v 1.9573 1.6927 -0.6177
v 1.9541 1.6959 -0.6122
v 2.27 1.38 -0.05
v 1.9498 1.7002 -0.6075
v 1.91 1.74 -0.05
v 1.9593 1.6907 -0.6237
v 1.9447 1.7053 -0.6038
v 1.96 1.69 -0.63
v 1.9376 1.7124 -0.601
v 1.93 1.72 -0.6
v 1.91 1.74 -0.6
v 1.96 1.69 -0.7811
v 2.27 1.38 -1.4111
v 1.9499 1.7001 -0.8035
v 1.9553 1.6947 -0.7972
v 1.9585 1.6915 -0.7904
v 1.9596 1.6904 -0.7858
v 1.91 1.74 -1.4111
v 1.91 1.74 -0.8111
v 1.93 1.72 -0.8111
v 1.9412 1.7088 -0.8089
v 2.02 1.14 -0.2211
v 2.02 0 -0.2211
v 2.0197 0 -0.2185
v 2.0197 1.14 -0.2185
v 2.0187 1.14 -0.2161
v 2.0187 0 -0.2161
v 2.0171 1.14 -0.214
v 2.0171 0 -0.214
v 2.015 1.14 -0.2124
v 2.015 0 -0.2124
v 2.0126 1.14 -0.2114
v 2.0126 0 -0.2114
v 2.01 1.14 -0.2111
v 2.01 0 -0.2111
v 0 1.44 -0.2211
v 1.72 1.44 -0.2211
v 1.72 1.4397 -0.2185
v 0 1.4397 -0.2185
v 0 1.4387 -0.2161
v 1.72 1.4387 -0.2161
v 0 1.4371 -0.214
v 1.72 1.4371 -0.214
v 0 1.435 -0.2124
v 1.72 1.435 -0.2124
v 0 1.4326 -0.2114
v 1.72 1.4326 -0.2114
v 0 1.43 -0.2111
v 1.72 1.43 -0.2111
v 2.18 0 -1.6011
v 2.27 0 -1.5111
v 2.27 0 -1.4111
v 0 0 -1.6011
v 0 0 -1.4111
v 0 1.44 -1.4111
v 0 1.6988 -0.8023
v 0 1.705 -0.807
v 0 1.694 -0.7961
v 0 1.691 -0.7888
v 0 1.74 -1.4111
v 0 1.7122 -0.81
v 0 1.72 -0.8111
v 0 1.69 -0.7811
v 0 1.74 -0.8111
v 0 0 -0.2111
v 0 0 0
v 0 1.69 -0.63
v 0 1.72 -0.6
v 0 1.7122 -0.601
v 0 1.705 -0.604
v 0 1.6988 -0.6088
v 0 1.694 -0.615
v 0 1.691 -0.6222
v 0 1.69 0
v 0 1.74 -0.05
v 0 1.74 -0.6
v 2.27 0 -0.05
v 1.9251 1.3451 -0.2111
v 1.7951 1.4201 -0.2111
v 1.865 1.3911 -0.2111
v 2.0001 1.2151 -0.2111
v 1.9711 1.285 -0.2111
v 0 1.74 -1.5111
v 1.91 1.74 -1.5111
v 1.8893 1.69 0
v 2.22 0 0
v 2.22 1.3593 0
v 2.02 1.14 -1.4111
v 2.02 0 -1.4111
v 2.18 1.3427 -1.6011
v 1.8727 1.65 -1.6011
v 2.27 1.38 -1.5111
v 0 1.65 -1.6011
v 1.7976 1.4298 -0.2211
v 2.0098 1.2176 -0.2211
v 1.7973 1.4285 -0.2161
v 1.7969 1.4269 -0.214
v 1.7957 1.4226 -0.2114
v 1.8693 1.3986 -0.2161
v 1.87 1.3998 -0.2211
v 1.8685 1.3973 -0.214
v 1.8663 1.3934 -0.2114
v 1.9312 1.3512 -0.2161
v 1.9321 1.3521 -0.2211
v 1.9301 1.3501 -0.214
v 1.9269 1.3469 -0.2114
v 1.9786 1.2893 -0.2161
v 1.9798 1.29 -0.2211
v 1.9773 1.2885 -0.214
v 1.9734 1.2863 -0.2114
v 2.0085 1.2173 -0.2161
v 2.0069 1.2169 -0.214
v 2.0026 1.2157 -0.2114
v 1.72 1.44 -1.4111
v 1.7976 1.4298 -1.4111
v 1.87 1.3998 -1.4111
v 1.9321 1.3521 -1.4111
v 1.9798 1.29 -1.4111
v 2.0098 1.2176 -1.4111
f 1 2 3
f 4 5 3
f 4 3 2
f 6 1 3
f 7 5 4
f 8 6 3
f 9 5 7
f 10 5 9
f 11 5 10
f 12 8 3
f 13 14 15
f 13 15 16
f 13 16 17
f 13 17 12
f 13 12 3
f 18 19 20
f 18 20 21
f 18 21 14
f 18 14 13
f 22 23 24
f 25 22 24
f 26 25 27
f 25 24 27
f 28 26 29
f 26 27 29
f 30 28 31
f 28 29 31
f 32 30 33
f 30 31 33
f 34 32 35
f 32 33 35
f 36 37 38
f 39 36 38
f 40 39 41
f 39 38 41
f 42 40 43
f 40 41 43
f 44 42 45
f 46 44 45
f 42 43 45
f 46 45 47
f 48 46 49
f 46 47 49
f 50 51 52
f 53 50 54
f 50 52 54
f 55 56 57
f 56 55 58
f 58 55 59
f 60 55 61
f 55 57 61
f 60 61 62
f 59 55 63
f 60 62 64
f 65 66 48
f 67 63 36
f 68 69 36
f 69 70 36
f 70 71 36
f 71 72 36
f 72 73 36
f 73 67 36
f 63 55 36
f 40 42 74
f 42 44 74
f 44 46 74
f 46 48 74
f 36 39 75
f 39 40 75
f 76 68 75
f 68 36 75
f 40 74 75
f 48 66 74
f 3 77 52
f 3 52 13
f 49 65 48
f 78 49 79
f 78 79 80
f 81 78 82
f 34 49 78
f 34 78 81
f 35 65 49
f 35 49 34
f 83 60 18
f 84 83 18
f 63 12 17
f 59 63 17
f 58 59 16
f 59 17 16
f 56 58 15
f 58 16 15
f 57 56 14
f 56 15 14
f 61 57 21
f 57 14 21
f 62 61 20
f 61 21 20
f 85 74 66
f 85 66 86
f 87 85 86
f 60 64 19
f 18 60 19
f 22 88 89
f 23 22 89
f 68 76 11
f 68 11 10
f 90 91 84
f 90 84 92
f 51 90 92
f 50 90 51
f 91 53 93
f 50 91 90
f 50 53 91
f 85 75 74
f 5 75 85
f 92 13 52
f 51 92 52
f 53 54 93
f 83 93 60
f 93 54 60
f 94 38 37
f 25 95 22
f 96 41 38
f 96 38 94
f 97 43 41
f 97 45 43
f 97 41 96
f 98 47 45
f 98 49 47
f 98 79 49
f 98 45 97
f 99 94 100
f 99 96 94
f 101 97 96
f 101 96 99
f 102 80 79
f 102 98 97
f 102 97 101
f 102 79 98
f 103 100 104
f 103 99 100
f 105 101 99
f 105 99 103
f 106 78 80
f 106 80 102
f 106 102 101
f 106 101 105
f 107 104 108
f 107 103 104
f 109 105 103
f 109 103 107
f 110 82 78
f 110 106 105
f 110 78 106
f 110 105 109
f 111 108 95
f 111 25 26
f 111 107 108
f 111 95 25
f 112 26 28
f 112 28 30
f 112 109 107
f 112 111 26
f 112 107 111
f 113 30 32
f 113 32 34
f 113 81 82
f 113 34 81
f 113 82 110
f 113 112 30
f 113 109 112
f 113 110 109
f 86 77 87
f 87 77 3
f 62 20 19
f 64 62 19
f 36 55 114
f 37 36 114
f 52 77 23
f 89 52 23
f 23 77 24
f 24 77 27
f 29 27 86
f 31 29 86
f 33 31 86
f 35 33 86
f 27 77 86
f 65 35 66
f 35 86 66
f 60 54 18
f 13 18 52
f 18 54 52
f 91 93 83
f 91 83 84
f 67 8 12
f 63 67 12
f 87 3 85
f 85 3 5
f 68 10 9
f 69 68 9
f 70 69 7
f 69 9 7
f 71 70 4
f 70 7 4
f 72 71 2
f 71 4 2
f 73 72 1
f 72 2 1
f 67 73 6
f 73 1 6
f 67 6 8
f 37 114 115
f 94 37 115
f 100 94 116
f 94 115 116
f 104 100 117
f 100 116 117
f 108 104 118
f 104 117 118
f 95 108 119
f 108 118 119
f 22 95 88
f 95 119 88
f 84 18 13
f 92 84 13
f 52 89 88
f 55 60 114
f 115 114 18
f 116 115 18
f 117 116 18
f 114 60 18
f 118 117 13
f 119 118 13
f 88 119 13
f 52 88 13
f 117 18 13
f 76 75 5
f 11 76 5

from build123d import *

# Parameters (mm, degrees)
F0_W      = 4.54
F0_H      = 3.48
F1_DEPTH  = 1.41106
F2_SIZE   = 0.36
F3_SIZE2  = 0.05
F3_SIZE   = 0.05
F5_DEPTH  = 4.541
F7_DEPTH  = 1.2
F8_R      = 0.01
F10_DEPTH = 0.19
F11_SIZE  = 0.09
F13_DEPTH = 25


with BuildPart() as f1:
    # F0 (on Top) → F1 (new body)
    with BuildSketch(Plane.XY):
        Rectangle(F0_W, F0_H)
    extrude(amount=-F1_DEPTH)

    # F2
    f2_edges = [f1.edges().sort_by_distance(p)[0] for p in [
        (-2.27, 1.74, -0.70553),
        (-2.27, -1.74, -0.70553),
        (2.27, 1.74, -0.70553),
        (2.27, -1.74, -0.70553),
    ]]
    chamfer(f2_edges, length=F2_SIZE)

    # F3
    f3_edges = [f1.edges().sort_by_distance(p)[0] for p in [
        (-2.27, 0, 0),
        (-2.09, 1.56, 0),
        (0, 1.74, 0),
        (2.09, 1.56, 0),
        (2.27, 0, 0),
        (2.09, -1.56, 0),
        (0, -1.74, 0),
        (-2.09, -1.56, 0),
    ]]
    chamfer(f3_edges, length=F3_SIZE, length2=F3_SIZE2)

    # F4 (on face) → F5 (cut, through all)
    with BuildSketch(Plane.YZ.offset(2.27)):
        with BuildLine():
            Line((-1.72, -0.6), (-1.74, -0.6))
            Line((-1.74, -0.6), (-1.74, -0.81106))
            Line((-1.74, -0.81106), (-1.72, -0.81106))
            ThreePointArc((-1.72, -0.81106), (-1.6987867966, -0.8022732034), (-1.69, -0.78106))
            Line((-1.69, -0.78106), (-1.69, -0.63))
            ThreePointArc((-1.69, -0.63), (-1.6987867966, -0.6087867966), (-1.72, -0.6))
        make_face()
        with BuildLine():
            Line((1.74, -0.81106), (1.74, -0.6))
            Line((1.74, -0.6), (1.72, -0.6))
            ThreePointArc((1.72, -0.6), (1.6987867966, -0.6087867966), (1.69, -0.63))
            Line((1.69, -0.63), (1.69, -0.78106))
            ThreePointArc((1.69, -0.78106), (1.6987867966, -0.8022732034), (1.72, -0.81106))
            Line((1.72, -0.81106), (1.74, -0.81106))
        make_face()
    extrude(amount=-F5_DEPTH, mode=Mode.SUBTRACT)

    # F6 (on face) → F7 (cut)
    with BuildSketch(Plane(origin=(0, 0, -1.41106), x_dir=(1, 0, 0), z_dir=(0, 0, -1))):
        with BuildLine():
            Line((1.72, 1.44), (-1.72, 1.44))
            ThreePointArc((-1.72, 1.44), (-1.9321320344, 1.3521320344), (-2.02, 1.14))
            Line((-2.02, 1.14), (-2.02, -1.14))
            ThreePointArc((-2.02, -1.14), (-1.9321320344, -1.3521320344), (-1.72, -1.44))
            Line((-1.72, -1.44), (1.72, -1.44))
            ThreePointArc((1.72, -1.44), (1.9321320344, -1.3521320344), (2.02, -1.14))
            Line((2.02, -1.14), (2.02, 1.14))
            ThreePointArc((2.02, 1.14), (1.9321320344, 1.3521320344), (1.72, 1.44))
        make_face()
    extrude(amount=-F7_DEPTH, mode=Mode.SUBTRACT)

    # F8
    f8_edges = [f1.edges().sort_by_distance(p)[0] for p in [
        (0, 1.44, -0.21106),
        (1.932132, 1.352132, -0.21106),
        (2.02, 0, -0.21106),
        (-1.932132, 1.352132, -0.21106),
        (1.932132, -1.352132, -0.21106),
        (0, -1.44, -0.21106),
        (-1.932132, -1.352132, -0.21106),
        (-2.02, 0, -0.21106),
    ]]
    fillet(f8_edges, radius=F8_R)


with BuildPart() as f10:
    # F9 (on face) → F10 (new body)
    with BuildSketch(Plane(origin=(0, 0, -1.41106), x_dir=(1, 0, 0), z_dir=(0, 0, -1))):
        Polygon((1.91, 1.74), (-1.91, 1.74), (-2.27, 1.38), (-2.27, -1.38), (-1.91, -1.74), (1.91, -1.74), (2.27, -1.38), (2.27, 1.38), align=None)
    extrude(amount=F10_DEPTH)

    # F11
    f11_edges = [f10.edges().sort_by_distance(p)[0] for p in [
        (-2.27, 0, -1.60106),
        (-2.09, -1.56, -1.60106),
        (0, -1.74, -1.60106),
        (2.09, -1.56, -1.60106),
        (2.27, 0, -1.60106),
        (2.09, 1.56, -1.60106),
        (0, 1.74, -1.60106),
        (-2.09, 1.56, -1.60106),
    ]]
    chamfer(f11_edges, length=F11_SIZE)


with BuildPart() as f13_tool:
    # F12 (on face) → F13 (new body)
    with BuildSketch(Plane.XY):
        Polygon((2.9397751205, 0), (0, 0), (0, 1.8302858807), (-2.3903283291, 1.8302858807), (-2.3903283291, -2.3388734553), (2.9397751205, -2.3388734553), align=None)
    extrude(amount=-F13_DEPTH)


with BuildPart() as f1_1:
    add(f1.part)

    # F13: cut by f13_tool
    add(f13_tool.part, mode=Mode.SUBTRACT)


with BuildPart() as f10_1:
    add(f10.part)

    # F13: cut by f13_tool
    add(f13_tool.part, mode=Mode.SUBTRACT)


solid = Compound([f1_1.part, f10_1.part])
